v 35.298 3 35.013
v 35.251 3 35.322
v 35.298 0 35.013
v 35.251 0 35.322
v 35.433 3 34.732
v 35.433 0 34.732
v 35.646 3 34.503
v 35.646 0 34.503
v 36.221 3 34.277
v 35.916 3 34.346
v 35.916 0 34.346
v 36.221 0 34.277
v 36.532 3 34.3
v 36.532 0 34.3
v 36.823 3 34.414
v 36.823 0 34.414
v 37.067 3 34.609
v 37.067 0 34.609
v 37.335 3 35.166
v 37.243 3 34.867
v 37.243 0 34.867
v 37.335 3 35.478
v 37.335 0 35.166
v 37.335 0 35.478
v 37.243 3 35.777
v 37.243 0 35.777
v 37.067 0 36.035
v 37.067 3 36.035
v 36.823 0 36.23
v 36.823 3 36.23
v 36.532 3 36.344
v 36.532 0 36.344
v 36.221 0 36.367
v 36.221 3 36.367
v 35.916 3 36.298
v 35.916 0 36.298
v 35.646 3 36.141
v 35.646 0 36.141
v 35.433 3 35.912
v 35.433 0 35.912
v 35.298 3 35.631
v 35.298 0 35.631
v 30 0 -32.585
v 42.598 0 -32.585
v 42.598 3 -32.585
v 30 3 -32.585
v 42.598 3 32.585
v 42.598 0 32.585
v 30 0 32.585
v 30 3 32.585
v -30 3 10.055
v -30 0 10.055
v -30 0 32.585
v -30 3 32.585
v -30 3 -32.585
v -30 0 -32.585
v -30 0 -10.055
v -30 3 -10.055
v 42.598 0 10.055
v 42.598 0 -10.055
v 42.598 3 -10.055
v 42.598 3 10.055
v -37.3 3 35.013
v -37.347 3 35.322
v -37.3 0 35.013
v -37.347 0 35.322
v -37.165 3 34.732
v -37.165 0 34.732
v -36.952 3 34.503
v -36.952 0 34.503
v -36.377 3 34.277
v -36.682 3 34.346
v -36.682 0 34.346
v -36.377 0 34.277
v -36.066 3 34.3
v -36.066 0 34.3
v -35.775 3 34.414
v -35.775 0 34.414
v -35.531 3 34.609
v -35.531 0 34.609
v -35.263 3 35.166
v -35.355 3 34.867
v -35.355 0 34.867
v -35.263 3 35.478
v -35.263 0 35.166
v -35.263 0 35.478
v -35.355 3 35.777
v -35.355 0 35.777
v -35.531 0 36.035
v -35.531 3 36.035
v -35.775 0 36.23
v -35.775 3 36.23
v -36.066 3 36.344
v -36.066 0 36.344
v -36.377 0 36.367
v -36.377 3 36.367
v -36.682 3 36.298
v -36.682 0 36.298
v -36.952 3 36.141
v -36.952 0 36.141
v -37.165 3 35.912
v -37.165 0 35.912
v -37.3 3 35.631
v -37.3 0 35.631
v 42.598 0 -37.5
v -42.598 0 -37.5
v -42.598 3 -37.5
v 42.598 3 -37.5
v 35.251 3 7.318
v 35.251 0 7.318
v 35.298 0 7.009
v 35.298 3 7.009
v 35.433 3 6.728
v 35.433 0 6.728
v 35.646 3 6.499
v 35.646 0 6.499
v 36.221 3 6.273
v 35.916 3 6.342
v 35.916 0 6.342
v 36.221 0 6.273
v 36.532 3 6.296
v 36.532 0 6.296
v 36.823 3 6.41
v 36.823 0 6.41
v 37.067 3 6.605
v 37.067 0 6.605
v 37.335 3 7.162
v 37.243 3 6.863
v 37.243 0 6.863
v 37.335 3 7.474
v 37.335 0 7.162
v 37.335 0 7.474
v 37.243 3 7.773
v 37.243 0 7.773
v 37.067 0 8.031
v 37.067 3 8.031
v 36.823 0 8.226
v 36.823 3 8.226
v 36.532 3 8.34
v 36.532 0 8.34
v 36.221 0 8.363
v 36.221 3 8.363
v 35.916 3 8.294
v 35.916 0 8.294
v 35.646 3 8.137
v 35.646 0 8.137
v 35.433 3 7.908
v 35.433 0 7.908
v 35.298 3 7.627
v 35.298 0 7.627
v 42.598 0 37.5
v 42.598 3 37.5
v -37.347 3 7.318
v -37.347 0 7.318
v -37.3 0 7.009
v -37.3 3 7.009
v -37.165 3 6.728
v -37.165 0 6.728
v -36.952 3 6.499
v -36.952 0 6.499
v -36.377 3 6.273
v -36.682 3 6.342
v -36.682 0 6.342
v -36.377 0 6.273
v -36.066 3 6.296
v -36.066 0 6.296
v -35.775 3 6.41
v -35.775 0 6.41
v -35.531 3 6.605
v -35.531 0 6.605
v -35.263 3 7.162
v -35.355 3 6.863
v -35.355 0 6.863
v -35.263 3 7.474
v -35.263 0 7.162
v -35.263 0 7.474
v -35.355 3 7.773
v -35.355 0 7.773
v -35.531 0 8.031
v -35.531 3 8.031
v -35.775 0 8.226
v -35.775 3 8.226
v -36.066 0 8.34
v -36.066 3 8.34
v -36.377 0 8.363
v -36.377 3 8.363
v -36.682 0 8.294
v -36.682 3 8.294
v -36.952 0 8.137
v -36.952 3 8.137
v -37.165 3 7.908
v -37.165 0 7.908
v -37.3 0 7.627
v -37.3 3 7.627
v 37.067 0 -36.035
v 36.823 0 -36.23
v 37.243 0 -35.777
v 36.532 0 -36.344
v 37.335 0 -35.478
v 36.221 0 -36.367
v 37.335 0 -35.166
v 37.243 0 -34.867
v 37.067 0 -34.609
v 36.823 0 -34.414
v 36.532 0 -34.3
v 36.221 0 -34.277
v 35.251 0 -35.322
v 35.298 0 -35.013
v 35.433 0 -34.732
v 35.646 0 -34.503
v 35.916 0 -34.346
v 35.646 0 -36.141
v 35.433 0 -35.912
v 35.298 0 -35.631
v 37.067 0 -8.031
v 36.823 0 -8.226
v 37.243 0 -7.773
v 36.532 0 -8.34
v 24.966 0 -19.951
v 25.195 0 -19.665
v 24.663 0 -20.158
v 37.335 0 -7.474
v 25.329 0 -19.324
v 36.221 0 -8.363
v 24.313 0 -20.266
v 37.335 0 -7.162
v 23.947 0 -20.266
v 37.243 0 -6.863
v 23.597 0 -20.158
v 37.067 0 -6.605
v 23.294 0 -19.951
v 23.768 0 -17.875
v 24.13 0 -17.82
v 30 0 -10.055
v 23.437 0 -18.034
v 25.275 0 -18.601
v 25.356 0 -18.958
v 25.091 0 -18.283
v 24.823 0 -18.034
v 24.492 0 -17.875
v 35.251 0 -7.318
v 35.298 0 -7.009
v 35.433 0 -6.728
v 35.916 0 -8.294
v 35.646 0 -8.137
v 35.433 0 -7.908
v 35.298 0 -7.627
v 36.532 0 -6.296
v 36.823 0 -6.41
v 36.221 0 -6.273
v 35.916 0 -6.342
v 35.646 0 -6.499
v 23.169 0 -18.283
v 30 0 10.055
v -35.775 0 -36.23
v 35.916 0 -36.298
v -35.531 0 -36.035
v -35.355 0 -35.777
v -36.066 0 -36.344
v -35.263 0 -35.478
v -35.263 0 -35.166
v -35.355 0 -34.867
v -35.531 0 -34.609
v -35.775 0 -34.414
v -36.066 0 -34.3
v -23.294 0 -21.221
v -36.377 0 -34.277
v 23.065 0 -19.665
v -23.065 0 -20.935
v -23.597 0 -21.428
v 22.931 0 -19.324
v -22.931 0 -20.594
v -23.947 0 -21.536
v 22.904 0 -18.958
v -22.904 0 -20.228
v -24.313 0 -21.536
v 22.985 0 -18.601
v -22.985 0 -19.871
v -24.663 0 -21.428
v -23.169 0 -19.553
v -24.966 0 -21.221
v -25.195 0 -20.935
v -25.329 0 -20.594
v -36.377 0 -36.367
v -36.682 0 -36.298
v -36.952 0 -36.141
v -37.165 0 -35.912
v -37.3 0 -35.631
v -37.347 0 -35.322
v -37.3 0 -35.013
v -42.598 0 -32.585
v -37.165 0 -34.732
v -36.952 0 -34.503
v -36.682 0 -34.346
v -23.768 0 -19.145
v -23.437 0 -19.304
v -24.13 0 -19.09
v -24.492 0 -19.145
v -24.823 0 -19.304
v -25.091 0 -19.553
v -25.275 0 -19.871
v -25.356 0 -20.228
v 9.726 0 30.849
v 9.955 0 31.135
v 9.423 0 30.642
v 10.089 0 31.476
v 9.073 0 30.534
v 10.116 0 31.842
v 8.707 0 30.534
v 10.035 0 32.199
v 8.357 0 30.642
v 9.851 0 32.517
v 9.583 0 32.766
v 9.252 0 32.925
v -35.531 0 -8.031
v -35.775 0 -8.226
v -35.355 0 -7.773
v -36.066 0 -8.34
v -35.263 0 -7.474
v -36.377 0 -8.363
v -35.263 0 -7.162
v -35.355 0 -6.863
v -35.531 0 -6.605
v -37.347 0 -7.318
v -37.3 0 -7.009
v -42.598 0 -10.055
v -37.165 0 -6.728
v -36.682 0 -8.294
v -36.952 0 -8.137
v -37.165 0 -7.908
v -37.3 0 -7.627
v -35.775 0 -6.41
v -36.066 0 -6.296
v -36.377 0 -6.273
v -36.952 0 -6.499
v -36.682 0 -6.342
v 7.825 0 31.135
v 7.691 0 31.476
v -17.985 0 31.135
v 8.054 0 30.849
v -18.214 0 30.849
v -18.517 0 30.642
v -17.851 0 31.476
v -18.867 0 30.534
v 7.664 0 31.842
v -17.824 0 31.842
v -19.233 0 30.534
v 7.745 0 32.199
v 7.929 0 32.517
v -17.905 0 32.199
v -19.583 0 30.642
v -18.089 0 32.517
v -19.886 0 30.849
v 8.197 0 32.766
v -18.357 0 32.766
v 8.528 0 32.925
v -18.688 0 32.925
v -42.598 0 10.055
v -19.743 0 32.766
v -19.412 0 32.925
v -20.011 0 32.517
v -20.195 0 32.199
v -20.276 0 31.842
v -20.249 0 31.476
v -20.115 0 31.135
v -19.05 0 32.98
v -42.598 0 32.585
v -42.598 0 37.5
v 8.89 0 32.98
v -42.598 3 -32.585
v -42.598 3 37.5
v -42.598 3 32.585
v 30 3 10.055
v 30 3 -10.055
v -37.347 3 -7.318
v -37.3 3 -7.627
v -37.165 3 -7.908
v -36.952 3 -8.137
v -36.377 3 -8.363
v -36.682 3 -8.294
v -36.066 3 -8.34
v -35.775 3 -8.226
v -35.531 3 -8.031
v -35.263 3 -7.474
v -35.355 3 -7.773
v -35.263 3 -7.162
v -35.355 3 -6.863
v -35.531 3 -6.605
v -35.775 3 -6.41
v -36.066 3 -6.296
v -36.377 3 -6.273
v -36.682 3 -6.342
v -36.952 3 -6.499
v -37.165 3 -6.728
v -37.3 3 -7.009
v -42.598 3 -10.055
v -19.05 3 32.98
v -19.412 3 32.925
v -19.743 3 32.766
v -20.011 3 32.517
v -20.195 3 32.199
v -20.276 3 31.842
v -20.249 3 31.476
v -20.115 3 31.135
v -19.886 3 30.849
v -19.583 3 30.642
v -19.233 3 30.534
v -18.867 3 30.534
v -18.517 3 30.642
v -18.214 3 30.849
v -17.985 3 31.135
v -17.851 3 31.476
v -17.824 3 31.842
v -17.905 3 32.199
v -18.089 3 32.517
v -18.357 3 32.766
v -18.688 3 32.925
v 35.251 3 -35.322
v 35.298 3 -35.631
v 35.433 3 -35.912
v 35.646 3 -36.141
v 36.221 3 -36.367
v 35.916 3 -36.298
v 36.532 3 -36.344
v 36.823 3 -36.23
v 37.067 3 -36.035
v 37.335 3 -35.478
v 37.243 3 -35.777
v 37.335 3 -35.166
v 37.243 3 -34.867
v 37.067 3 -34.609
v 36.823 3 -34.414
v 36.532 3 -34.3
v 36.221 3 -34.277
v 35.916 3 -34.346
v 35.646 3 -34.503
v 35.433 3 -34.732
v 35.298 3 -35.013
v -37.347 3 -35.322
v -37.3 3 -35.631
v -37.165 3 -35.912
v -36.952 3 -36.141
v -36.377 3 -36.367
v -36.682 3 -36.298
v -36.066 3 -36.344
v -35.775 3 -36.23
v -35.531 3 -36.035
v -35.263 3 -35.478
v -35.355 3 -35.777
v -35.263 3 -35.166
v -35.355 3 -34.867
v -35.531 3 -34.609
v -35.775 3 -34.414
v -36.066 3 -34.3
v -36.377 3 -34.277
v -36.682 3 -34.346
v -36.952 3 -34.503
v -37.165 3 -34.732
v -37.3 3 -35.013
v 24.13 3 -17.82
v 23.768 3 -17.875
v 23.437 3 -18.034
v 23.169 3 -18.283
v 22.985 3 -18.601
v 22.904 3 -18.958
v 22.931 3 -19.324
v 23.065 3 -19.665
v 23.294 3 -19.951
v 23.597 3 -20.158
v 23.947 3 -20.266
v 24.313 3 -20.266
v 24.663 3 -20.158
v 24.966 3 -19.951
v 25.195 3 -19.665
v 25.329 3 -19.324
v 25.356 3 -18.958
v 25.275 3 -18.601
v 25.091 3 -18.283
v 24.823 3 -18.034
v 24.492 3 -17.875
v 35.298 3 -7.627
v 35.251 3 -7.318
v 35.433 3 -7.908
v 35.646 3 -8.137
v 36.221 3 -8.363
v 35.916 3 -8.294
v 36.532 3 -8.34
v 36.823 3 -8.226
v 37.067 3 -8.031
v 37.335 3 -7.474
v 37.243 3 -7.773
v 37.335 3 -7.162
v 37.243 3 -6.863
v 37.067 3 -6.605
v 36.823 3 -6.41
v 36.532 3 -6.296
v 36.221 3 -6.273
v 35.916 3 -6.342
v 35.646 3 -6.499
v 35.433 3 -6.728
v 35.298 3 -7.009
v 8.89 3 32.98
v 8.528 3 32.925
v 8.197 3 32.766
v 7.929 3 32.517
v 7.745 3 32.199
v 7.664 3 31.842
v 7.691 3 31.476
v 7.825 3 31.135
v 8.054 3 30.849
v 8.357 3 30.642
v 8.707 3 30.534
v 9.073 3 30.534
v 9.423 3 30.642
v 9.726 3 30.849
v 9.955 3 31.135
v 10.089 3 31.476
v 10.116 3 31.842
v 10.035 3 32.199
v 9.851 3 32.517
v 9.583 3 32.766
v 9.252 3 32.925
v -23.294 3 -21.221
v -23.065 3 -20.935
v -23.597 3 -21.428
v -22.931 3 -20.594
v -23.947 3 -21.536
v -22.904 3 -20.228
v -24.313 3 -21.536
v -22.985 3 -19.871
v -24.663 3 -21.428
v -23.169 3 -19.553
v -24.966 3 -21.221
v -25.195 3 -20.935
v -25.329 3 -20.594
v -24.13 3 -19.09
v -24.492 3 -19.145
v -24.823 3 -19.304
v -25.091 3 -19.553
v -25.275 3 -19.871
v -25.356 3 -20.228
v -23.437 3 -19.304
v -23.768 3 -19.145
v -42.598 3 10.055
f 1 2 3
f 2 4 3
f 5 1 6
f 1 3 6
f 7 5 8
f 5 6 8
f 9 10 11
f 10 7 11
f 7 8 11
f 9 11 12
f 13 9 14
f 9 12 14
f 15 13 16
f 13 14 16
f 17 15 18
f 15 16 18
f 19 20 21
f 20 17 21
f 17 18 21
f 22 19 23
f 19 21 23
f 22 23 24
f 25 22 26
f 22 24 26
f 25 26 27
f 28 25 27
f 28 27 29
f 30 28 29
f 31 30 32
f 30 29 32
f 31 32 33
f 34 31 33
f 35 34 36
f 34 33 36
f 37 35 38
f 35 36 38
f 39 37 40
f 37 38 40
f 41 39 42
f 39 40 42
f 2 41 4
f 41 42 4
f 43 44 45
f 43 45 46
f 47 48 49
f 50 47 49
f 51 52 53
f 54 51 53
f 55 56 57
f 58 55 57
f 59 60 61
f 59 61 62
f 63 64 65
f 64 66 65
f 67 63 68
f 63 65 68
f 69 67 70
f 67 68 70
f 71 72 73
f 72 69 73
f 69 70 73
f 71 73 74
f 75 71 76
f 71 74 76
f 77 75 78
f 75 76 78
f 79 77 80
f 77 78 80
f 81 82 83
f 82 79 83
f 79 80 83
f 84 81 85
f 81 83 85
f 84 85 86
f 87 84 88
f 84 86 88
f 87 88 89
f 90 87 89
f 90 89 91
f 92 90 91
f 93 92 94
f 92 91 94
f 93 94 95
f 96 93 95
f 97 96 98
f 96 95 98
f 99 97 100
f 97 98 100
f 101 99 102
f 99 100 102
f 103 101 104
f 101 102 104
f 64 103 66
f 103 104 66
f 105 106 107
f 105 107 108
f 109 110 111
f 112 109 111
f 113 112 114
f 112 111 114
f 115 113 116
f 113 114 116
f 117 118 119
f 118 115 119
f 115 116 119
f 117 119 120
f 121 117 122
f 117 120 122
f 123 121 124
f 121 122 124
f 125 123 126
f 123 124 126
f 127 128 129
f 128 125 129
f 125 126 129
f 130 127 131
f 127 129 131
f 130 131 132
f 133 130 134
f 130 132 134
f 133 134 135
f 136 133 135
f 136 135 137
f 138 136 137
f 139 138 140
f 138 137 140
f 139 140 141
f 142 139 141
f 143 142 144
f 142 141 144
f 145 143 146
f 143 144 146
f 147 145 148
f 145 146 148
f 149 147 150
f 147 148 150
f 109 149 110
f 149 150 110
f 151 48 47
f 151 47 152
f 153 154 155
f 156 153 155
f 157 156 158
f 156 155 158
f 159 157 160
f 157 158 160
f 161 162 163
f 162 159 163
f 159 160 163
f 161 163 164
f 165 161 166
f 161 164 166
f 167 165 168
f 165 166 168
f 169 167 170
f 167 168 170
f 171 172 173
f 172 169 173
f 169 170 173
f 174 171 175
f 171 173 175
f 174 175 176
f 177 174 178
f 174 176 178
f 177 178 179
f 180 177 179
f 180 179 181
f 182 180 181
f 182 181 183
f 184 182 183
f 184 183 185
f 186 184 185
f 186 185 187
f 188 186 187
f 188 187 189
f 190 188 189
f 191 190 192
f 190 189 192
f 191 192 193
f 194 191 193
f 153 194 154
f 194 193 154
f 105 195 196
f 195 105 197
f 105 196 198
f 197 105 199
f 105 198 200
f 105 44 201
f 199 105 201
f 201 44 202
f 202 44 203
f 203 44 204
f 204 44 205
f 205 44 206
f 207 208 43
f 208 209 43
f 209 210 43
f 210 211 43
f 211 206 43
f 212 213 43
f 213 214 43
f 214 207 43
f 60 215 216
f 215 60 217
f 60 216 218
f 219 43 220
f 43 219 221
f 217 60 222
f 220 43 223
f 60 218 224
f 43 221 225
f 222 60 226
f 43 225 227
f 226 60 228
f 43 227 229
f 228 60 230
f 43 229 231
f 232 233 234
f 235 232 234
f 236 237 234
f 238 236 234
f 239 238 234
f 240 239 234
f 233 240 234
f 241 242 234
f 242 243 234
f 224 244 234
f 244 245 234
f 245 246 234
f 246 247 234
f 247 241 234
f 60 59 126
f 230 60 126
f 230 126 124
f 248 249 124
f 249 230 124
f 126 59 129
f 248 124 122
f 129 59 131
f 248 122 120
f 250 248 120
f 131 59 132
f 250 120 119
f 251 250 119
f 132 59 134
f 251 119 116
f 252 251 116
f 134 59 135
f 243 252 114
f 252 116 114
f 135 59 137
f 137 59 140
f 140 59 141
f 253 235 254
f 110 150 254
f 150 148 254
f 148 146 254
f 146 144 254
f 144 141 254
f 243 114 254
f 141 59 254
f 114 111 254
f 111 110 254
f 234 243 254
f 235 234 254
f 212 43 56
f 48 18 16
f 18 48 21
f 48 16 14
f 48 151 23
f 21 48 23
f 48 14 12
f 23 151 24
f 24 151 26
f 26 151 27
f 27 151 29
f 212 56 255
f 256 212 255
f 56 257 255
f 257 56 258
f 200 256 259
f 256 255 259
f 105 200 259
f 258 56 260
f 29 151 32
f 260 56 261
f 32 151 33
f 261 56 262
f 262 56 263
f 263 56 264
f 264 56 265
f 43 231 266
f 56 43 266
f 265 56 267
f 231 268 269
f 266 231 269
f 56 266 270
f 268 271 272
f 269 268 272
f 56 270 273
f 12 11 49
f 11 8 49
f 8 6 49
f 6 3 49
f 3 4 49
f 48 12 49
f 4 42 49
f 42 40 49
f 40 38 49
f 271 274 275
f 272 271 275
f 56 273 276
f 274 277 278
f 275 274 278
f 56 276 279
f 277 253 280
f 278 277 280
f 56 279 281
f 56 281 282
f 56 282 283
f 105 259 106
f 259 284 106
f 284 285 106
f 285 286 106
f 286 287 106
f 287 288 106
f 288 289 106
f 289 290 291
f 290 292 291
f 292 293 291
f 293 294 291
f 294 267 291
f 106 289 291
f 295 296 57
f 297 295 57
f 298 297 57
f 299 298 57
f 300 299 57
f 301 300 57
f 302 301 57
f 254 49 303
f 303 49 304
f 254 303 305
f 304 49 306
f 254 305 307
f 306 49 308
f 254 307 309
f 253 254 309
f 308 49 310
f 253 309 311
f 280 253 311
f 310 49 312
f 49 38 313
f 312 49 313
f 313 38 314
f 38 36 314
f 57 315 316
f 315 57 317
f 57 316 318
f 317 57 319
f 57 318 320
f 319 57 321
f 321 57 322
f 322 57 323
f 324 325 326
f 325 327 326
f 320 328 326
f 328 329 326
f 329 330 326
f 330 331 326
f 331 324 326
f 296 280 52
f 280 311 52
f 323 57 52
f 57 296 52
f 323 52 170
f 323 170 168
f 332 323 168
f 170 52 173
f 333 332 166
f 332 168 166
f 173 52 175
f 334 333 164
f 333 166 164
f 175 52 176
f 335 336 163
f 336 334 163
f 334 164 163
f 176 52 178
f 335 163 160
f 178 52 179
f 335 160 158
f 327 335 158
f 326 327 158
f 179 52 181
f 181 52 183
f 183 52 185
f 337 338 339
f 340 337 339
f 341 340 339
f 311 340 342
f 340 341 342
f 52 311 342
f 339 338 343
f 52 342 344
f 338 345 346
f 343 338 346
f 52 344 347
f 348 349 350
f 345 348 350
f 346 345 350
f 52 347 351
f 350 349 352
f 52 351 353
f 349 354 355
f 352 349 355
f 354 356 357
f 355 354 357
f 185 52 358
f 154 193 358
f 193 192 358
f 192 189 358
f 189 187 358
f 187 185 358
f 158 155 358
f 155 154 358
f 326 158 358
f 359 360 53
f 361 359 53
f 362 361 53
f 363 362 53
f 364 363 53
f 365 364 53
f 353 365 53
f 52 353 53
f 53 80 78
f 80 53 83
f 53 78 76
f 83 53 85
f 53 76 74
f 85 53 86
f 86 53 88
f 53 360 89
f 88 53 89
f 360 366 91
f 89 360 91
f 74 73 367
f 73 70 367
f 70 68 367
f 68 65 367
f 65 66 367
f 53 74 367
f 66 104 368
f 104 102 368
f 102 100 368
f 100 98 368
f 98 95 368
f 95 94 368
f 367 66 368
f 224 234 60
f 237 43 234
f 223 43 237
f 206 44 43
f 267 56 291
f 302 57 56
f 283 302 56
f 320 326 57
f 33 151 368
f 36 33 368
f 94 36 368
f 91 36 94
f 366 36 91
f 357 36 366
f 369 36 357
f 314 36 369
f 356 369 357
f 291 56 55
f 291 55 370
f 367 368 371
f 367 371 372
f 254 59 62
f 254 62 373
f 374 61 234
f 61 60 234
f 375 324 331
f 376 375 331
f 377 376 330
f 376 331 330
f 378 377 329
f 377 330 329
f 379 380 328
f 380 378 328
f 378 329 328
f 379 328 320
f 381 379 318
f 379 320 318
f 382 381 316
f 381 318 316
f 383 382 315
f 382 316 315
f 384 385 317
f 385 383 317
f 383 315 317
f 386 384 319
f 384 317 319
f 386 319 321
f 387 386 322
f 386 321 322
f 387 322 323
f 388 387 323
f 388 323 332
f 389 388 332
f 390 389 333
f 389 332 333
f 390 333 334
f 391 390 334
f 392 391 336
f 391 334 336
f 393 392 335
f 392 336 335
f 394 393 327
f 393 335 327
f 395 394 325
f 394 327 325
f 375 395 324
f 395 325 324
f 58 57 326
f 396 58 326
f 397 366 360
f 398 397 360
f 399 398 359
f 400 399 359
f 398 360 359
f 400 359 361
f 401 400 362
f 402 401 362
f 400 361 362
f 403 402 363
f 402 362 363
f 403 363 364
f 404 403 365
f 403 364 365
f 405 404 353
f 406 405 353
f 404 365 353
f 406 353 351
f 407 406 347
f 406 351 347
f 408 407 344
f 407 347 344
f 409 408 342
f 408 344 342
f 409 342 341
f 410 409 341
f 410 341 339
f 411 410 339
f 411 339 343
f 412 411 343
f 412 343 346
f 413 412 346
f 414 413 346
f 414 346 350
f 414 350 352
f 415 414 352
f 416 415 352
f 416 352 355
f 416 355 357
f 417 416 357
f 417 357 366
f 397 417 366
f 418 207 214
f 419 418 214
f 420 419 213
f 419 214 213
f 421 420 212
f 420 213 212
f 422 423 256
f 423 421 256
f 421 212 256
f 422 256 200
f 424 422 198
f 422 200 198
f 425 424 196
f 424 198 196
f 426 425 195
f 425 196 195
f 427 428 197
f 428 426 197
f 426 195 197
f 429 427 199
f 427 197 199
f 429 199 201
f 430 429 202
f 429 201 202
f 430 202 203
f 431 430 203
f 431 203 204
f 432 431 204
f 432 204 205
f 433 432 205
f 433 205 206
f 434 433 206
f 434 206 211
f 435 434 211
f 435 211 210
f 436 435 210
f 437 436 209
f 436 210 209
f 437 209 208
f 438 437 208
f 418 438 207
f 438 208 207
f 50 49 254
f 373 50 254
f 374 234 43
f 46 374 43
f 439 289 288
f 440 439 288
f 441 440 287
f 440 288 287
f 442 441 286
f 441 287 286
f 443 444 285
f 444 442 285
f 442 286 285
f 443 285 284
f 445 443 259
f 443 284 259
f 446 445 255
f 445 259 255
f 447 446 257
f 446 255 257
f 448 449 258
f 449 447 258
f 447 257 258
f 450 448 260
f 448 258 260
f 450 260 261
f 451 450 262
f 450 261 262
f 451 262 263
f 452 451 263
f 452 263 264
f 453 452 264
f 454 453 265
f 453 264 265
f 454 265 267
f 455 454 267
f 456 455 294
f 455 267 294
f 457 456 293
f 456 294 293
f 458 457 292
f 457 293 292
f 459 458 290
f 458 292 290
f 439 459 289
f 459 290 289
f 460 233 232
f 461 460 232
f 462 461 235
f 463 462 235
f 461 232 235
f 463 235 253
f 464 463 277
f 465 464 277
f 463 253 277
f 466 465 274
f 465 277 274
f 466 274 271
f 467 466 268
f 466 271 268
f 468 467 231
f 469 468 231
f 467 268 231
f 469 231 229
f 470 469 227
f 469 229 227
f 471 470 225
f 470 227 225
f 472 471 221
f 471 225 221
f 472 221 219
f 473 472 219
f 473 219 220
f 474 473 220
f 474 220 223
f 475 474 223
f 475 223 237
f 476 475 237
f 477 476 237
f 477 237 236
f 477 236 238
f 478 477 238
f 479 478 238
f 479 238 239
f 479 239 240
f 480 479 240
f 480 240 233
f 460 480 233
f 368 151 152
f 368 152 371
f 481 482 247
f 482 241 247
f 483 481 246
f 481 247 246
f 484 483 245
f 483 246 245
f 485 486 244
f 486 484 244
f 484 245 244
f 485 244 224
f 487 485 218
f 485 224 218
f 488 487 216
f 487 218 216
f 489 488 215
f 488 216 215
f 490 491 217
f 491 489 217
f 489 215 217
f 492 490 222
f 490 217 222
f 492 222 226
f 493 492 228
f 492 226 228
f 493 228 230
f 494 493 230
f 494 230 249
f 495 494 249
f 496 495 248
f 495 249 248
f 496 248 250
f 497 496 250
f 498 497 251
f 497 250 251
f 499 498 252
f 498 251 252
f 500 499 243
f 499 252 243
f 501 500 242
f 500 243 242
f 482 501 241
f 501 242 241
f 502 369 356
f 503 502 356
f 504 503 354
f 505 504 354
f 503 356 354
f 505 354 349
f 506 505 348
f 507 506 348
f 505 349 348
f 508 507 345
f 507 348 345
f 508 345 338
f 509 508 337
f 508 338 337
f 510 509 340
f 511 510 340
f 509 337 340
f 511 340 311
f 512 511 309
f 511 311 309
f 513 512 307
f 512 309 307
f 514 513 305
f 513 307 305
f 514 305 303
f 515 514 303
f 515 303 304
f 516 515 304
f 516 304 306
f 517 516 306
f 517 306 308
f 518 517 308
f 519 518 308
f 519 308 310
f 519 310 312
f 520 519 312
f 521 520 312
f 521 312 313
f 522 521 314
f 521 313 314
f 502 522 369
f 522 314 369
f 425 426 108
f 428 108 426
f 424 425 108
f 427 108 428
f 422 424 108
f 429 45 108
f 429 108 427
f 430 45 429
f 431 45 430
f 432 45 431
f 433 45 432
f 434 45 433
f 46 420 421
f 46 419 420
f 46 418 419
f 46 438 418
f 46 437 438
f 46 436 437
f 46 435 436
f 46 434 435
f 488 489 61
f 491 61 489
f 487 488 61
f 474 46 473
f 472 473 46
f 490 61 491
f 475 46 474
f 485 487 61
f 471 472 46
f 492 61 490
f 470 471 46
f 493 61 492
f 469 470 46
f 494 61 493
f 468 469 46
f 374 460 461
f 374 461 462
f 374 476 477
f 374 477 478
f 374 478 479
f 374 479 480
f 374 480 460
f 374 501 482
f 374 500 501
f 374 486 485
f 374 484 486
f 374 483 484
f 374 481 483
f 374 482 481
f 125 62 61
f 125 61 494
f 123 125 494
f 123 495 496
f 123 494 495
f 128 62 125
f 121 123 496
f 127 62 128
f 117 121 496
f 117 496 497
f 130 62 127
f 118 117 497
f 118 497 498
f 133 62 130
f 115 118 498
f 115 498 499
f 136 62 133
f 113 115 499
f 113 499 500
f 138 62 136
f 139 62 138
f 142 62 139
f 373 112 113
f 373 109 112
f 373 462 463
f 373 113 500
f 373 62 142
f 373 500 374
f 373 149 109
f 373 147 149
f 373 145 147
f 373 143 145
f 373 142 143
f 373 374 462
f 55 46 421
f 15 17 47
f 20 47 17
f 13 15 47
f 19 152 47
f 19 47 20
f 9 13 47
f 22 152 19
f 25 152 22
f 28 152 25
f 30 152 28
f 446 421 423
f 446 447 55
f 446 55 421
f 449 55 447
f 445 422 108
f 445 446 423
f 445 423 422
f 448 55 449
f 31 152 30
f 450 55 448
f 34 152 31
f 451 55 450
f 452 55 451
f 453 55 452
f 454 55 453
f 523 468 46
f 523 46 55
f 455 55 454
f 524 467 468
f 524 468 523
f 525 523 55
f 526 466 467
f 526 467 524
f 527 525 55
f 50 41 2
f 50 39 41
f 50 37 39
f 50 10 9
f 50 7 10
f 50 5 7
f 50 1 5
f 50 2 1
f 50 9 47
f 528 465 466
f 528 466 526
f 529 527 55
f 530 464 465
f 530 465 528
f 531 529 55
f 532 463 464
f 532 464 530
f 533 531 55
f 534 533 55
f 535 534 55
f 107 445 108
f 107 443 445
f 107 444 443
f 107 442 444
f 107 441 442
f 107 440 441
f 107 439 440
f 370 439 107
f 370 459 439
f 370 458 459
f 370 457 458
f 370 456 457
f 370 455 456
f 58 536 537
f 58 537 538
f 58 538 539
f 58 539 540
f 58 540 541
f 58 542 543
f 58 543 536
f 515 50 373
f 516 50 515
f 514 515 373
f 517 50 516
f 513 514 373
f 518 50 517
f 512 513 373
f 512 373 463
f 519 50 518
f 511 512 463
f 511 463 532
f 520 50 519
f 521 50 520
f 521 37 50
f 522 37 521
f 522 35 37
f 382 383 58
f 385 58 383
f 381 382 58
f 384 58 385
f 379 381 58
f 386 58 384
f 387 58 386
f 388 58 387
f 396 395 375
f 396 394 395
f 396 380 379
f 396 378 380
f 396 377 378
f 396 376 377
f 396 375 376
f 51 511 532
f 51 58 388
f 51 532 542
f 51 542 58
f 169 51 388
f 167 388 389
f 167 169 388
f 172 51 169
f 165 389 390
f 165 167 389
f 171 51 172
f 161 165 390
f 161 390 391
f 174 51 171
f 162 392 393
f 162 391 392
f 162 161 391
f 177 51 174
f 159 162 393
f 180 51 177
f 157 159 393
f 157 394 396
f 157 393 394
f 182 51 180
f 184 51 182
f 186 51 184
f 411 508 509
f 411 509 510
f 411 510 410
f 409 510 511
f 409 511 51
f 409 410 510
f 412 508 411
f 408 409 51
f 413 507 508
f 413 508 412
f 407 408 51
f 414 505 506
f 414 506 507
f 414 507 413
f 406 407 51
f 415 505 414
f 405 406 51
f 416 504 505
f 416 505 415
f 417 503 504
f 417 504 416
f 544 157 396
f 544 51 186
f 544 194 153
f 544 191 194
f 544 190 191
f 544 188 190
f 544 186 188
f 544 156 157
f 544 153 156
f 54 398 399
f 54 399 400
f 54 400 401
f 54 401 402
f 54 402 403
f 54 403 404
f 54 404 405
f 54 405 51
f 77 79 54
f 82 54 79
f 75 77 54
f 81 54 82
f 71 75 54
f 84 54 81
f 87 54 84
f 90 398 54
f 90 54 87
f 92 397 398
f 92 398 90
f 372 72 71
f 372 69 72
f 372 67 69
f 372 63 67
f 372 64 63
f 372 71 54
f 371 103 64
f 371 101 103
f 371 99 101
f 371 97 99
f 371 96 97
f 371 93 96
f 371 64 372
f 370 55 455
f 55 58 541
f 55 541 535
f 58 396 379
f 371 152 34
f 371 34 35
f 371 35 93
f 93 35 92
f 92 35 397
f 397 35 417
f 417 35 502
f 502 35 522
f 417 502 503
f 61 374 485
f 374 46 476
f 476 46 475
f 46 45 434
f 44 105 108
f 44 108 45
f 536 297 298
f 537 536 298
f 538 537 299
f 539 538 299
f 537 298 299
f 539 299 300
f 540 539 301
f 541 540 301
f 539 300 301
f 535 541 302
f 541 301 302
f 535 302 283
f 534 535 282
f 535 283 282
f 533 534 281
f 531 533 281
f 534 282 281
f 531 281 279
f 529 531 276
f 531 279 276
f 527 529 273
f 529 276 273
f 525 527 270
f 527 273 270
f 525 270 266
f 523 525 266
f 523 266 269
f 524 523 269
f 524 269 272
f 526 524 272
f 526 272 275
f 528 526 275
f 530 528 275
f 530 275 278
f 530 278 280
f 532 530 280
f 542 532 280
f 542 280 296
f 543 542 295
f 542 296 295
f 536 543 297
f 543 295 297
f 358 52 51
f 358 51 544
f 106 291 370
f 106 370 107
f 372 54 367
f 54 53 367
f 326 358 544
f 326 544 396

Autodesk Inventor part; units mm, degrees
ref_plane "YZ Plane" through (0, 0, 0) normal (1, 0, 0) x (0, 1, 0)
ref_plane "XZ Plane" through (0, 0, 0) normal (0, 1, 0) x (-1, 0, 0)
ref_plane "XY Plane" through (0, 0, 0) normal (0, 0, 1) x (1, 0, 0)
sketch "Servo Hole" plane through (0, 0, 0) normal (0, 0, 1) x (1, 0, 0)
  line L0 (-67.0819, 53.6212) -> (-54.4839, 53.6212) construction
  line L1 (-54.4839, 53.6212) -> (-54.4839, 48.7062) construction
  line L2 (-54.4839, 21.2612) -> (-67.0819, 21.2612) construction
  circle A0 centre (-60.7829, 51.4432) radius 1.048
  line L3 (-67.0819, 48.7062) -> (-54.4839, 48.7062)
  line L4 (-67.0819, 26.1762) -> (-54.4839, 26.1762)
  line L5 (-54.4839, 37.4412) -> (-67.0819, 37.4412) construction
  line L6 (-54.4839, 48.7062) -> (-54.4839, 26.1762)
  line L7 (-54.4839, 26.1762) -> (-54.4839, 21.2612) construction
  line L8 (-67.0819, 48.7062) -> (-67.0819, 53.6212) construction
  line L9 (-67.0819, 26.1762) -> (-67.0819, 48.7062)
  line L10 (-67.0819, 21.2612) -> (-67.0819, 26.1762) construction
  line L11 (-60.7829, 53.6212) -> (-60.7829, 21.2612) construction
  circle A1 centre (-60.7829, 23.4392) radius 1.048
  point P0 (-60.7829, 37.4412)
  dimension "d0" = 32.36
  dimension "d2" = 2.178
  dimension "d3" = 2.096
  dimension "d4" = 22.53
  dimension "d5" = 2.096
  dimension "d6" = 2.178
sketch "Sketch1" plane through (0, 0, 0) normal (0, 1, 0) x (-1, 0, 0)
  line L0 (-42.598, 37.5) -> (42.598, 37.5)
  line L1 (42.598, 37.5) -> (42.598, -37.5)
  line L2 (42.598, -37.5) -> (-42.598, -37.5)
  line L3 (-42.598, -37.5) -> (-42.598, 37.5)
  line L4 (-42.598, 0) -> (42.598, 0) construction
  line L5 (0, 37.5) -> (0, -37.5) construction
  line L6 (-42.598, 37.5) -> (-30, 37.5) construction
  line L7 (-30, 37.5) -> (-30, 32.585) construction
  line L8 (-30, 5.14) -> (-42.598, 5.14) construction
  circle A0 centre (-36.299, 35.322) radius 1.048
  line L9 (-42.598, 32.585) -> (-30, 32.585)
  line L10 (-42.598, 10.055) -> (-30, 10.055)
  line L11 (-30, 21.32) -> (-42.598, 21.32) construction
  line L12 (-30, 32.585) -> (-30, 10.055)
  line L13 (-30, 10.055) -> (-30, 5.14) construction
  line L14 (-42.598, 32.585) -> (-42.598, 37.5) construction
  line L15 (-42.598, 10.055) -> (-42.598, 32.585)
  line L16 (-42.598, 5.14) -> (-42.598, 10.055) construction
  line L17 (-36.299, 37.5) -> (-36.299, 5.14) construction
  circle A1 centre (-36.299, 7.318) radius 1.048
  line L18 (30, 37.5) -> (42.598, 37.5) construction
  line L19 (42.598, 37.5) -> (42.598, 32.585) construction
  line L20 (42.598, 5.14) -> (30, 5.14) construction
  circle A2 centre (36.299, 35.322) radius 1.048
  line L21 (30, 32.585) -> (42.598, 32.585)
  line L22 (30, 10.055) -> (42.598, 10.055)
  line L23 (42.598, 21.32) -> (30, 21.32) construction
  line L24 (42.598, 32.585) -> (42.598, 10.055)
  line L25 (42.598, 10.055) -> (42.598, 5.14) construction
  line L26 (30, 32.585) -> (30, 37.5) construction
  line L27 (30, 10.055) -> (30, 32.585)
  line L28 (30, 5.14) -> (30, 10.055) construction
  line L29 (36.299, 37.5) -> (36.299, 5.14) construction
  circle A3 centre (36.299, 7.318) radius 1.048
  line L30 (-42.598, -5.14) -> (-30, -5.14) construction
  line L31 (-30, -5.14) -> (-30, -10.055) construction
  line L32 (-30, -37.5) -> (-42.598, -37.5) construction
  circle A4 centre (-36.299, -7.318) radius 1.048
  line L33 (-42.598, -10.055) -> (-30, -10.055)
  line L34 (-42.598, -32.585) -> (-30, -32.585)
  line L35 (-30, -21.32) -> (-42.598, -21.32) construction
  line L36 (-30, -10.055) -> (-30, -32.585)
  line L37 (-30, -32.585) -> (-30, -37.5) construction
  line L38 (-42.598, -10.055) -> (-42.598, -5.14) construction
  line L39 (-42.598, -32.585) -> (-42.598, -10.055)
  line L40 (-42.598, -37.5) -> (-42.598, -32.585) construction
  line L41 (-36.299, -5.14) -> (-36.299, -37.5) construction
  circle A5 centre (-36.299, -35.322) radius 1.048
  line L42 (30, -5.14) -> (42.598, -5.14) construction
  line L43 (42.598, -5.14) -> (42.598, -10.055) construction
  line L44 (42.598, -37.5) -> (30, -37.5) construction
  circle A6 centre (36.299, -7.318) radius 1.048
  line L45 (30, -10.055) -> (42.598, -10.055)
  line L46 (30, -32.585) -> (42.598, -32.585)
  line L47 (42.598, -21.32) -> (30, -21.32) construction
  line L48 (42.598, -10.055) -> (42.598, -32.585)
  line L49 (42.598, -32.585) -> (42.598, -37.5) construction
  line L50 (30, -10.055) -> (30, -5.14) construction
  line L51 (30, -32.585) -> (30, -10.055)
  line L52 (30, -37.5) -> (30, -32.585) construction
  line L53 (36.299, -5.14) -> (36.299, -37.5) construction
  circle A7 centre (36.299, -35.322) radius 1.048
  point P0 (0, 0)
  point P1 (0, 0)
  dimension "d12" = 60
  dimension "d8" = 85.196
  dimension "d9" = 75
extrude "Extrusion1" add sketch "Sketch1" along normal blind 3 contours L0 L1 L21 L27 L22 L45 L51 L46 L2 L3 L34 L36 L33 L10 L12 L9
sketch "Sketch2" plane through (0, 3, 0) normal (0, 1, 0) x (1, 0, 0)
  line L0 (-42.598, 10.055) -> (-42.598, -10.055) projected
  line L1 (-42.598, -37.5) -> (42.598, -37.5) projected
  line L2 (42.598, -10.055) -> (42.598, 10.055) projected
  line L3 (42.598, 37.5) -> (-42.598, 37.5) projected
  line L4 (26.67, -34.29) -> (-26.67, -34.29)
  line L5 (-26.67, -34.29) -> (-26.67, 34.29)
  line L6 (-26.67, 34.29) -> (26.67, 34.29)
  line L7 (26.67, 34.29) -> (26.67, -34.29)
  circle A0 centre (-24.13, 20.32) radius 1.5
  circle A1 centre (-19.05, -31.75) radius 1.5
  circle A2 centre (24.13, 19.05) radius 1.5
  line L8 (0, 37.5) -> (0, -37.5) construction
  line L9 (42.598, 0) -> (-42.598, 0) construction
  circle A3 centre (8.89, -31.75) radius 1.5
  point P0 (0, 0)
  dimension "d18" = 3
  dimension "d19" = 2.54
  dimension "d20" = 13.97
  dimension "d21" = 53.34
  dimension "d22" = 68.58
  dimension "d23" = 3
  dimension "d24" = 7.62
  dimension "d25" = 2.54
  dimension "d28" = 3
  dimension "d29" = 2.54
  dimension "d30" = 15.24
  dimension "d31" = 3
  dimension "d32" = 27.94
hole "Hole1" at (-24.13, 3, -20.32) at (24.13, 3, -19.05) at (8.89, 3, 31.75) at (-19.05, 3, 31.75) direction (0, -1, 0) diameter 2.459 end through all thread size "M3x0.5" class "6H" standard "ISO Metric profile"
properties part number "Base"
